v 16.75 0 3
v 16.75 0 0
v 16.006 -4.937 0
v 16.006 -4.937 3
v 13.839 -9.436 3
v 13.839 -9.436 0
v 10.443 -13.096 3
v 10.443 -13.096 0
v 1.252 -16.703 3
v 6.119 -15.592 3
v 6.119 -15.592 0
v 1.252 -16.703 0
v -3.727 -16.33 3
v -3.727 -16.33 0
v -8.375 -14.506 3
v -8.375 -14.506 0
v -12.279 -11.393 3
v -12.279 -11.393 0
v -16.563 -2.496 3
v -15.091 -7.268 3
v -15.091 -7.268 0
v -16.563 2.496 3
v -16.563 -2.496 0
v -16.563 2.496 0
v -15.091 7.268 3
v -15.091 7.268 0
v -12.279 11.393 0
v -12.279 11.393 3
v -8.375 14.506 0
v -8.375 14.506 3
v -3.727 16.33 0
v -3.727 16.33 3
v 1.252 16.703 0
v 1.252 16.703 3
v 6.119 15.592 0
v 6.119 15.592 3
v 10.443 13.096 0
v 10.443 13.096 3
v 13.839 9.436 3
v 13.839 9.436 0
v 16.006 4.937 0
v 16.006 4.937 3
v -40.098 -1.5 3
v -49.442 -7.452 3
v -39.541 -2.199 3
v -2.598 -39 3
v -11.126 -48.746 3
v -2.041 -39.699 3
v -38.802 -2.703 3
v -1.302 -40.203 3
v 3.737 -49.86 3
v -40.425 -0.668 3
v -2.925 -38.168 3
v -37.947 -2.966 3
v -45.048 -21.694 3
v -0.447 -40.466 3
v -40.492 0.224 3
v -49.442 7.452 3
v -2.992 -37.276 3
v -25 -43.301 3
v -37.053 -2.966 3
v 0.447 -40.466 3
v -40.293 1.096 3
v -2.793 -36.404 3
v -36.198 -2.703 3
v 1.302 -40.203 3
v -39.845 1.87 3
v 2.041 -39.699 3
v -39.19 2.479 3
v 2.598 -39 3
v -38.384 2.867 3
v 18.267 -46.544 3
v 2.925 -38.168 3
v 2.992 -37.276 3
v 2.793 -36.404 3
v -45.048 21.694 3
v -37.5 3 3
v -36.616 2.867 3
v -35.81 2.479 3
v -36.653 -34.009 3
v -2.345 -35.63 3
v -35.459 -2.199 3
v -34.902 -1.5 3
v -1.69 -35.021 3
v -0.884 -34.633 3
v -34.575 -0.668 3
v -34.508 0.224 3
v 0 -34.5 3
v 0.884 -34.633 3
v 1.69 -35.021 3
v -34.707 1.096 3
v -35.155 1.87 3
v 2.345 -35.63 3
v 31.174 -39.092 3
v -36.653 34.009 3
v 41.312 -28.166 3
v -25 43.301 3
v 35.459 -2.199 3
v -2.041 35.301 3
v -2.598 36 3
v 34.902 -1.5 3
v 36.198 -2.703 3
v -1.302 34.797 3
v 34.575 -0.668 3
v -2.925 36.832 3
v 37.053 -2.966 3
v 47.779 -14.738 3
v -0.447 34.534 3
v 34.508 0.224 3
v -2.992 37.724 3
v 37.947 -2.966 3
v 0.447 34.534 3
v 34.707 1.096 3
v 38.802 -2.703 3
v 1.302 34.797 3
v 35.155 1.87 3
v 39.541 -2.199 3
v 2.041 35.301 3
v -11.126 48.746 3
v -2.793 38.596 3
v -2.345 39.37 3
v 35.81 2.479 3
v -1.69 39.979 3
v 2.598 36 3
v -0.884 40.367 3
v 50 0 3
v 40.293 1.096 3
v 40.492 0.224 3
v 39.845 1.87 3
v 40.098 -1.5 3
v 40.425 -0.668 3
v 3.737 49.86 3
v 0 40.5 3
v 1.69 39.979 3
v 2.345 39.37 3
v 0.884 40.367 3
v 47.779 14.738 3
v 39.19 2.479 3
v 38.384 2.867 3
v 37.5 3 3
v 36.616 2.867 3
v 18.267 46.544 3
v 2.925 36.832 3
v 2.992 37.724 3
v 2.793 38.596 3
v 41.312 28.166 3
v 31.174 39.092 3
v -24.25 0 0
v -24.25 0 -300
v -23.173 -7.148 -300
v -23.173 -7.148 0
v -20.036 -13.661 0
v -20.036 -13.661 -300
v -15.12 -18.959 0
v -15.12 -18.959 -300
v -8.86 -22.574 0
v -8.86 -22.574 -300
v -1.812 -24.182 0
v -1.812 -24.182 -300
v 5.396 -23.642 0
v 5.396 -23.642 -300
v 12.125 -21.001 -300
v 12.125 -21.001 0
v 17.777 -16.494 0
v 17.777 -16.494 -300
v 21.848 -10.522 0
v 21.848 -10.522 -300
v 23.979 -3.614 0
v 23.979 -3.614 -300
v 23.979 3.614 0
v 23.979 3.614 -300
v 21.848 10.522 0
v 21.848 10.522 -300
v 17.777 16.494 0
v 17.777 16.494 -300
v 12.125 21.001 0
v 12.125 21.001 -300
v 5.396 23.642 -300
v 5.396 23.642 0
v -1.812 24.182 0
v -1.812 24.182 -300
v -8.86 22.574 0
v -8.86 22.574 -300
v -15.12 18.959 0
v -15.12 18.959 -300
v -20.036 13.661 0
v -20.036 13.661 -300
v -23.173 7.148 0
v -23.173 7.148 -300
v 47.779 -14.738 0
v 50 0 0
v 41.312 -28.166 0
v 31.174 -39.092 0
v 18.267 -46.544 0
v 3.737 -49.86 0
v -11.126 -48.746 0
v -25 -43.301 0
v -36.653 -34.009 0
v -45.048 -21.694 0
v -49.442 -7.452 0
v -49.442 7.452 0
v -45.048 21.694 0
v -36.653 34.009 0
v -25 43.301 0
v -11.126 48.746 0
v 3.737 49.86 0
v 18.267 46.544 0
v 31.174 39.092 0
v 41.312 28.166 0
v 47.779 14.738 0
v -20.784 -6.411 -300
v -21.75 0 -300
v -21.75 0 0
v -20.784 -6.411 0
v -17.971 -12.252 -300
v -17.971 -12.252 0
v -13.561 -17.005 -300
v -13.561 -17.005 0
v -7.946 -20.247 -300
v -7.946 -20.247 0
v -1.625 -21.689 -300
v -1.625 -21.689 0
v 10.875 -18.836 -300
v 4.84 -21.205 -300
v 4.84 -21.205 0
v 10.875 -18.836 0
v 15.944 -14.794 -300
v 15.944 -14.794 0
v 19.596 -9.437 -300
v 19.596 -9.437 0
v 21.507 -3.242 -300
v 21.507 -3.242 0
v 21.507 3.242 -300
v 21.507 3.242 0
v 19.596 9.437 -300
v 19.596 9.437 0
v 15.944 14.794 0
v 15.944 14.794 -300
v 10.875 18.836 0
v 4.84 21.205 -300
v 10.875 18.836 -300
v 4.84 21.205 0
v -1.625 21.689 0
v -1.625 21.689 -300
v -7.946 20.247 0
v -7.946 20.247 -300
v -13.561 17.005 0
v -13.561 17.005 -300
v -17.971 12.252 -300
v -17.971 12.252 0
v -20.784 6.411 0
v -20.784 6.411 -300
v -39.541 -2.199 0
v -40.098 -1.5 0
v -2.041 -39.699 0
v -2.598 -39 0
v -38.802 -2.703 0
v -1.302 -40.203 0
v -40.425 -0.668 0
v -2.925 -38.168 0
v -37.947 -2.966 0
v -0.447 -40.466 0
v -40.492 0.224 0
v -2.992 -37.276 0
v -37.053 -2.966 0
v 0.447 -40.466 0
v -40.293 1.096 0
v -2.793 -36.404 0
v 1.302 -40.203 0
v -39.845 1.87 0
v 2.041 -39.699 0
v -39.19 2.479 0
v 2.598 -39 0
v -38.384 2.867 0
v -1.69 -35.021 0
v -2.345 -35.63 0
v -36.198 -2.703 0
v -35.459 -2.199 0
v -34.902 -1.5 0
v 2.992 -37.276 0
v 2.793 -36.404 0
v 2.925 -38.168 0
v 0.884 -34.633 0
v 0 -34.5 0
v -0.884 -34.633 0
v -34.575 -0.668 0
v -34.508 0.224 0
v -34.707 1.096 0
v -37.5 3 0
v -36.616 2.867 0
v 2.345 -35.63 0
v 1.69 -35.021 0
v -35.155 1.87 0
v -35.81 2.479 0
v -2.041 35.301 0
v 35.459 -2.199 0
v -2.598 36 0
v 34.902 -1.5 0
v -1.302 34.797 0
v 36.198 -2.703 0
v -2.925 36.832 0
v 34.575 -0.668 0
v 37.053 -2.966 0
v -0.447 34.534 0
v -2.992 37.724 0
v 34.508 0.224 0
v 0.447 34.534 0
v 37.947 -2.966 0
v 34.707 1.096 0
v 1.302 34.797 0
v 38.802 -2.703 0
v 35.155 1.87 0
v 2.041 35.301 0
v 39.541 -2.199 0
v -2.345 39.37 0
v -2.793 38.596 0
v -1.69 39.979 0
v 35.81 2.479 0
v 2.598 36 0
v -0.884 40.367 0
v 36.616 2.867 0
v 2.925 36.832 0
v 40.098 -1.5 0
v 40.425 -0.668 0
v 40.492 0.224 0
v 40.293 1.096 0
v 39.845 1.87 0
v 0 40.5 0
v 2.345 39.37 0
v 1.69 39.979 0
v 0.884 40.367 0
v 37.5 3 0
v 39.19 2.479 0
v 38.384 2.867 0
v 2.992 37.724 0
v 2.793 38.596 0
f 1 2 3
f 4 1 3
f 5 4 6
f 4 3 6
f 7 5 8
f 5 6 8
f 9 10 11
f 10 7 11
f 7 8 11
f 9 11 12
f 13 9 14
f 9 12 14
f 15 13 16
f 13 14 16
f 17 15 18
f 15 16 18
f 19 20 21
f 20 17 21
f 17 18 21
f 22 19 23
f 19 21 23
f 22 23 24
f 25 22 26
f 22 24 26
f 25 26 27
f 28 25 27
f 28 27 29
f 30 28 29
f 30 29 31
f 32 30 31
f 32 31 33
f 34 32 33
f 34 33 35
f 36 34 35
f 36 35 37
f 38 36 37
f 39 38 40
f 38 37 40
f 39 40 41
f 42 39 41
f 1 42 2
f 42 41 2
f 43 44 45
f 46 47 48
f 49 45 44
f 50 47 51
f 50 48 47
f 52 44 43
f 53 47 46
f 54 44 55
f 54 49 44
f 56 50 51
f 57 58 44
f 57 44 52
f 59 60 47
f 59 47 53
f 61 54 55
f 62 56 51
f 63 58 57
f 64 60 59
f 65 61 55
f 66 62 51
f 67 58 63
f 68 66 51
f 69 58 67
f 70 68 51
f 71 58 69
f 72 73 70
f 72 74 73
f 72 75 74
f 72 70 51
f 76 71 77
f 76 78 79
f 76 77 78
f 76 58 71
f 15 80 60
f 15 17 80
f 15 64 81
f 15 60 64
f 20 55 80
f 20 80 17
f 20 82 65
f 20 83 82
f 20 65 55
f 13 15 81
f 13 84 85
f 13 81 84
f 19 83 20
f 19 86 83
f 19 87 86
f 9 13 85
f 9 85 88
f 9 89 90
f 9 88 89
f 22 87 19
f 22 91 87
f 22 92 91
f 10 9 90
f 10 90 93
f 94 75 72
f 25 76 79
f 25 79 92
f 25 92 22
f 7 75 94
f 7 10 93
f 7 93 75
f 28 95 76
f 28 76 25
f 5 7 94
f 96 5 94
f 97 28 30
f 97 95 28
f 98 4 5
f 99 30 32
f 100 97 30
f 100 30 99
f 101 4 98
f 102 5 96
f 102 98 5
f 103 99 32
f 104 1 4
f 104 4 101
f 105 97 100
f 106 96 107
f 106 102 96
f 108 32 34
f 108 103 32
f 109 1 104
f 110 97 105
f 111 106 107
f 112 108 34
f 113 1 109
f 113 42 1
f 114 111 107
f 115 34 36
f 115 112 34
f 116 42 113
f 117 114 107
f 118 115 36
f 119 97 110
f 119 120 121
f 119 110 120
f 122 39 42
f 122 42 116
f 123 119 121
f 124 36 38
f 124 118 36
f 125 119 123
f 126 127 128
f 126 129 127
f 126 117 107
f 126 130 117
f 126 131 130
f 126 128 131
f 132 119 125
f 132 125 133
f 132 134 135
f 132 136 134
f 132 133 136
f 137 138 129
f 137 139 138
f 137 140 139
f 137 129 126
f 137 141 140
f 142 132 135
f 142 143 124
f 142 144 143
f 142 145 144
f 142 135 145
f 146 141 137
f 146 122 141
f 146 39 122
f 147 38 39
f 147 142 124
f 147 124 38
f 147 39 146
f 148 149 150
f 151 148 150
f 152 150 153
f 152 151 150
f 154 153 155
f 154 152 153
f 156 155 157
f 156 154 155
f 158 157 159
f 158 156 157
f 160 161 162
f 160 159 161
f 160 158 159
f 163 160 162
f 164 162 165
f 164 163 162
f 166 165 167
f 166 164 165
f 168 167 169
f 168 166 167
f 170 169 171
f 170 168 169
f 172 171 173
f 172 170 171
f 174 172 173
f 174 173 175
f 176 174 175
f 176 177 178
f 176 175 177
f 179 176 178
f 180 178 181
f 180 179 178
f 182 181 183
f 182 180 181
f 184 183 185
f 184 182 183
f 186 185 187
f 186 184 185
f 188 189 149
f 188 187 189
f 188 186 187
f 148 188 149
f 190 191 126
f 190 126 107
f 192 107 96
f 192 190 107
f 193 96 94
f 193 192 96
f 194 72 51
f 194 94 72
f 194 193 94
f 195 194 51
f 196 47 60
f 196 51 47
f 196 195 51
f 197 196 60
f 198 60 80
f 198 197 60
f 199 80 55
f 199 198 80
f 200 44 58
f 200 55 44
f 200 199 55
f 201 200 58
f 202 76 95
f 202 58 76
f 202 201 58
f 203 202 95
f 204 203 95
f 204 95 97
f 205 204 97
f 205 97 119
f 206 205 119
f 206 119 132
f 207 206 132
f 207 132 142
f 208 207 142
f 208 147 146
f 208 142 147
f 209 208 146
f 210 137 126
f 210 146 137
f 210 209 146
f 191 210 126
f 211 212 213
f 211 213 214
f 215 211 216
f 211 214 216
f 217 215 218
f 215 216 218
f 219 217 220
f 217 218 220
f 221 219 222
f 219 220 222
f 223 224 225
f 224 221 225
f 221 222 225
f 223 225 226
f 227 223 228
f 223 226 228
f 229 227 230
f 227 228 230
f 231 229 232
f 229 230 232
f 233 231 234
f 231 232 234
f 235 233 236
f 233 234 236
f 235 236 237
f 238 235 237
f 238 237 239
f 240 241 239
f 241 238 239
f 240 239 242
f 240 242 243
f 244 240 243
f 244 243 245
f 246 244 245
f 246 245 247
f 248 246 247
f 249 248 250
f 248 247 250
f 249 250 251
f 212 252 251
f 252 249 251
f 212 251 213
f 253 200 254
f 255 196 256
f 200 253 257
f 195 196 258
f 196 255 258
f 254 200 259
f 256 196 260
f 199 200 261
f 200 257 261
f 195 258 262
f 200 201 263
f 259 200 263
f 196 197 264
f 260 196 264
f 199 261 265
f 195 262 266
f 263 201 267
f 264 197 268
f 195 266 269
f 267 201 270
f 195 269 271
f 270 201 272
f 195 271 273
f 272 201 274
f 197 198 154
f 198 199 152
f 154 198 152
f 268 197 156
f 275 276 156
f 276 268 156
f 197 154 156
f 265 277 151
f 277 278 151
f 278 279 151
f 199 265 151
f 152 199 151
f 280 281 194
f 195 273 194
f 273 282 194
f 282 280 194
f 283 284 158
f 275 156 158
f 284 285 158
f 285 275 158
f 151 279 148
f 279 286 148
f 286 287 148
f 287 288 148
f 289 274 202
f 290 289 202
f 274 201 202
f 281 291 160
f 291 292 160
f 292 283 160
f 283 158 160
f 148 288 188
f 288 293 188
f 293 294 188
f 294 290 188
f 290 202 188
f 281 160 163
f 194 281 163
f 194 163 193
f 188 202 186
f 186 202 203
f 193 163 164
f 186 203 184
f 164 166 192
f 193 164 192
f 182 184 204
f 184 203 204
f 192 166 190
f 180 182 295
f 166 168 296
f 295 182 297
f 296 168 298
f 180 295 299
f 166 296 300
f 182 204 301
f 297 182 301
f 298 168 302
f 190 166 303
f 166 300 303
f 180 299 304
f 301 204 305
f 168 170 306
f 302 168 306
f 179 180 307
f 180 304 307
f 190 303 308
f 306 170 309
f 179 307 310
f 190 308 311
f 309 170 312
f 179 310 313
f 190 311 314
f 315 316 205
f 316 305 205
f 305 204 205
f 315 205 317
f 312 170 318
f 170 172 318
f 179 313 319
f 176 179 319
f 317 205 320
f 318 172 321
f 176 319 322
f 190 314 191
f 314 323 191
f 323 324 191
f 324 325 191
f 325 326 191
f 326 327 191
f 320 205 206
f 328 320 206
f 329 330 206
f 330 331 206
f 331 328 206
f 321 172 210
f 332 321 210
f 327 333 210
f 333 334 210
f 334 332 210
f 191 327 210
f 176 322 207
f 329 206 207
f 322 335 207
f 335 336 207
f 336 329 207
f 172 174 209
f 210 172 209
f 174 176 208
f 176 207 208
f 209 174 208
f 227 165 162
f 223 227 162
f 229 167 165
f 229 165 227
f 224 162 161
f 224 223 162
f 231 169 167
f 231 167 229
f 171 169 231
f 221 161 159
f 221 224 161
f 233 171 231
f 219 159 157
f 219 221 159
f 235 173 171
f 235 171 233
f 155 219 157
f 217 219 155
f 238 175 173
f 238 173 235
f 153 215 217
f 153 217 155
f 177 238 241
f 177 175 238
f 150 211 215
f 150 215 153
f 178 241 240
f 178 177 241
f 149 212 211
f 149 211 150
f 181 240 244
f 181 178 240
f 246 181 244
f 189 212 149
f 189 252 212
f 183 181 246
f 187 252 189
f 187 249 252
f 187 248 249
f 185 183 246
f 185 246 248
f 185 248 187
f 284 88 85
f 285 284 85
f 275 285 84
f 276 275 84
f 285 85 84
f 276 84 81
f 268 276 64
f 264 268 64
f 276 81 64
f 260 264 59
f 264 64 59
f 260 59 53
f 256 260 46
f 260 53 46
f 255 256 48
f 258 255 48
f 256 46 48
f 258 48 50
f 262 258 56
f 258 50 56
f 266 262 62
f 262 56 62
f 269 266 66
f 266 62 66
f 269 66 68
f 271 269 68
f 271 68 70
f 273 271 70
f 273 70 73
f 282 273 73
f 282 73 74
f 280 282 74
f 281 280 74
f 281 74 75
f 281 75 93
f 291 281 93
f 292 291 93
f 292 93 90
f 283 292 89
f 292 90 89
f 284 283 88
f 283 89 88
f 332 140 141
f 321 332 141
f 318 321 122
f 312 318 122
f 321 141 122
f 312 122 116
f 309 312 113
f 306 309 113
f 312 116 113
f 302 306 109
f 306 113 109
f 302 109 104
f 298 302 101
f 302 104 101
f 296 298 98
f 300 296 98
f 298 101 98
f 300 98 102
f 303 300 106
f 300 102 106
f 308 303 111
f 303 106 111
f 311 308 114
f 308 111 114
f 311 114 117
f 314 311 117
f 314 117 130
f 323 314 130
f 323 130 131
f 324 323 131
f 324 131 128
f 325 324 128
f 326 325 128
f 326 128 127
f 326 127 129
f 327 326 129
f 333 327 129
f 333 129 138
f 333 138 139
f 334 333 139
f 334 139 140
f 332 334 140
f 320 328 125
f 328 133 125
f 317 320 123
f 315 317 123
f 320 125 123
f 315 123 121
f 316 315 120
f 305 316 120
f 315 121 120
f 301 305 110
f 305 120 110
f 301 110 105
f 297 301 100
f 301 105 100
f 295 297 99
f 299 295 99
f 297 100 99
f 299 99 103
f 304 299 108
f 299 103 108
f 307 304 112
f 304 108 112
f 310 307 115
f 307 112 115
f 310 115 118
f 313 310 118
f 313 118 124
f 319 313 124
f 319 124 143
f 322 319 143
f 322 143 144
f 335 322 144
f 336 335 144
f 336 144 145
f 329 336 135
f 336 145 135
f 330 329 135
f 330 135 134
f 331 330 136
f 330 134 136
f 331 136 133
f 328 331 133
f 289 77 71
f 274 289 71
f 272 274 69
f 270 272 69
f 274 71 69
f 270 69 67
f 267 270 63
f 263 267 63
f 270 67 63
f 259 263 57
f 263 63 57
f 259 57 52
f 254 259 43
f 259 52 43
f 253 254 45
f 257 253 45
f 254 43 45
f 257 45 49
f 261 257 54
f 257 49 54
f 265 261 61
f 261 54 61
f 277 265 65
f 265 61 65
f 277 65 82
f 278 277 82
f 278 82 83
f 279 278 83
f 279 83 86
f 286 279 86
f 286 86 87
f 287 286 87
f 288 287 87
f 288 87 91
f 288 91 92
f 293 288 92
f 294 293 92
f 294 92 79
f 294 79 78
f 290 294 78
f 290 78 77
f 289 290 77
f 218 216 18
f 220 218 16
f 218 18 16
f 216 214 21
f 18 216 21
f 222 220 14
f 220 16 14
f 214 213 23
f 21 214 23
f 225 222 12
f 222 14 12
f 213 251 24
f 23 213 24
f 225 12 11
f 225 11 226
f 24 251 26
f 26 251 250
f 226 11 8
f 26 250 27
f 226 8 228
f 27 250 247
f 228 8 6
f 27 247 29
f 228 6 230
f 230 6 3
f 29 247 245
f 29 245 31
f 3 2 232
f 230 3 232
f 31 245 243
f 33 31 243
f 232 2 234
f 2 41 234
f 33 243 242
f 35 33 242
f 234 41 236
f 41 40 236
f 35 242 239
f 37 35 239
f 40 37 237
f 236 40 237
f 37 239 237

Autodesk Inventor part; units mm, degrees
ref_plane "YZ Plane" through (0, 0, 0) normal (1, 0, 0) x (0, 1, 0)
ref_plane "XZ Plane" through (0, 0, 0) normal (0, 1, 0) x (-1, 0, 0)
ref_plane "Work Plane1" through (0, 0, 0) normal (0, 0, 1) x (1, 0, 0)
sketch "Sketch2" plane through (0, 0, 0) normal (0, 0, 1) x (1, 0, 0)
  circle A0 centre (0, 0) radius 16.75
  circle A1 centre (0, 0) radius 50
  point P0 (0, 0)
  dimension "d0" = 33.5
  dimension "d25" = 100
extrude "Extrusion1" add sketch "Sketch2" along normal blind 3
sketch "Sketch3" plane through (0, 0, 0) normal (0, 0, -1) x (-1, 0, 0)
  circle A0 centre (0, 0) radius 24.25
  circle A1 centre (0, 0) radius 21.75
  point P0 (0, 0)
  dimension "d4" = 48.5
  dimension "d26" = 2.5
extrude "Extrusion2" add sketch "Sketch3" along normal blind 300
sketch "Sketch4" plane through (0, 0, 0) normal (0, 0, -1) x (-1, 0, 0)
  circle A0 centre (0, 0) radius 16.75 projected
  circle A1 centre (0, 0) radius 37.5 construction
  circle A2 centre (37.5, 0) radius 3
  circle A3 centre (0, 0) radius 37.5 construction
  circle A4 centre (0, 37.5) radius 3
  circle A5 centre (0, 0) radius 37.5 construction
  circle A6 centre (-37.5, 0) radius 3
  circle A7 centre (0, 0) radius 37.5 construction
  circle A8 centre (0, -37.5) radius 3
  point P0 (0, 0)
  dimension "d9" = 75
  dimension "d10" = 6
  dimension "d13" = 360
hole "Hole1" at (-37.5, 0, 0) at (0, -37.5, 0) at (37.5, 0, 0) at (0, 37.5, 0) direction (0, 0, 1) diameter 6 end through all
properties part number "40mm_flange"
